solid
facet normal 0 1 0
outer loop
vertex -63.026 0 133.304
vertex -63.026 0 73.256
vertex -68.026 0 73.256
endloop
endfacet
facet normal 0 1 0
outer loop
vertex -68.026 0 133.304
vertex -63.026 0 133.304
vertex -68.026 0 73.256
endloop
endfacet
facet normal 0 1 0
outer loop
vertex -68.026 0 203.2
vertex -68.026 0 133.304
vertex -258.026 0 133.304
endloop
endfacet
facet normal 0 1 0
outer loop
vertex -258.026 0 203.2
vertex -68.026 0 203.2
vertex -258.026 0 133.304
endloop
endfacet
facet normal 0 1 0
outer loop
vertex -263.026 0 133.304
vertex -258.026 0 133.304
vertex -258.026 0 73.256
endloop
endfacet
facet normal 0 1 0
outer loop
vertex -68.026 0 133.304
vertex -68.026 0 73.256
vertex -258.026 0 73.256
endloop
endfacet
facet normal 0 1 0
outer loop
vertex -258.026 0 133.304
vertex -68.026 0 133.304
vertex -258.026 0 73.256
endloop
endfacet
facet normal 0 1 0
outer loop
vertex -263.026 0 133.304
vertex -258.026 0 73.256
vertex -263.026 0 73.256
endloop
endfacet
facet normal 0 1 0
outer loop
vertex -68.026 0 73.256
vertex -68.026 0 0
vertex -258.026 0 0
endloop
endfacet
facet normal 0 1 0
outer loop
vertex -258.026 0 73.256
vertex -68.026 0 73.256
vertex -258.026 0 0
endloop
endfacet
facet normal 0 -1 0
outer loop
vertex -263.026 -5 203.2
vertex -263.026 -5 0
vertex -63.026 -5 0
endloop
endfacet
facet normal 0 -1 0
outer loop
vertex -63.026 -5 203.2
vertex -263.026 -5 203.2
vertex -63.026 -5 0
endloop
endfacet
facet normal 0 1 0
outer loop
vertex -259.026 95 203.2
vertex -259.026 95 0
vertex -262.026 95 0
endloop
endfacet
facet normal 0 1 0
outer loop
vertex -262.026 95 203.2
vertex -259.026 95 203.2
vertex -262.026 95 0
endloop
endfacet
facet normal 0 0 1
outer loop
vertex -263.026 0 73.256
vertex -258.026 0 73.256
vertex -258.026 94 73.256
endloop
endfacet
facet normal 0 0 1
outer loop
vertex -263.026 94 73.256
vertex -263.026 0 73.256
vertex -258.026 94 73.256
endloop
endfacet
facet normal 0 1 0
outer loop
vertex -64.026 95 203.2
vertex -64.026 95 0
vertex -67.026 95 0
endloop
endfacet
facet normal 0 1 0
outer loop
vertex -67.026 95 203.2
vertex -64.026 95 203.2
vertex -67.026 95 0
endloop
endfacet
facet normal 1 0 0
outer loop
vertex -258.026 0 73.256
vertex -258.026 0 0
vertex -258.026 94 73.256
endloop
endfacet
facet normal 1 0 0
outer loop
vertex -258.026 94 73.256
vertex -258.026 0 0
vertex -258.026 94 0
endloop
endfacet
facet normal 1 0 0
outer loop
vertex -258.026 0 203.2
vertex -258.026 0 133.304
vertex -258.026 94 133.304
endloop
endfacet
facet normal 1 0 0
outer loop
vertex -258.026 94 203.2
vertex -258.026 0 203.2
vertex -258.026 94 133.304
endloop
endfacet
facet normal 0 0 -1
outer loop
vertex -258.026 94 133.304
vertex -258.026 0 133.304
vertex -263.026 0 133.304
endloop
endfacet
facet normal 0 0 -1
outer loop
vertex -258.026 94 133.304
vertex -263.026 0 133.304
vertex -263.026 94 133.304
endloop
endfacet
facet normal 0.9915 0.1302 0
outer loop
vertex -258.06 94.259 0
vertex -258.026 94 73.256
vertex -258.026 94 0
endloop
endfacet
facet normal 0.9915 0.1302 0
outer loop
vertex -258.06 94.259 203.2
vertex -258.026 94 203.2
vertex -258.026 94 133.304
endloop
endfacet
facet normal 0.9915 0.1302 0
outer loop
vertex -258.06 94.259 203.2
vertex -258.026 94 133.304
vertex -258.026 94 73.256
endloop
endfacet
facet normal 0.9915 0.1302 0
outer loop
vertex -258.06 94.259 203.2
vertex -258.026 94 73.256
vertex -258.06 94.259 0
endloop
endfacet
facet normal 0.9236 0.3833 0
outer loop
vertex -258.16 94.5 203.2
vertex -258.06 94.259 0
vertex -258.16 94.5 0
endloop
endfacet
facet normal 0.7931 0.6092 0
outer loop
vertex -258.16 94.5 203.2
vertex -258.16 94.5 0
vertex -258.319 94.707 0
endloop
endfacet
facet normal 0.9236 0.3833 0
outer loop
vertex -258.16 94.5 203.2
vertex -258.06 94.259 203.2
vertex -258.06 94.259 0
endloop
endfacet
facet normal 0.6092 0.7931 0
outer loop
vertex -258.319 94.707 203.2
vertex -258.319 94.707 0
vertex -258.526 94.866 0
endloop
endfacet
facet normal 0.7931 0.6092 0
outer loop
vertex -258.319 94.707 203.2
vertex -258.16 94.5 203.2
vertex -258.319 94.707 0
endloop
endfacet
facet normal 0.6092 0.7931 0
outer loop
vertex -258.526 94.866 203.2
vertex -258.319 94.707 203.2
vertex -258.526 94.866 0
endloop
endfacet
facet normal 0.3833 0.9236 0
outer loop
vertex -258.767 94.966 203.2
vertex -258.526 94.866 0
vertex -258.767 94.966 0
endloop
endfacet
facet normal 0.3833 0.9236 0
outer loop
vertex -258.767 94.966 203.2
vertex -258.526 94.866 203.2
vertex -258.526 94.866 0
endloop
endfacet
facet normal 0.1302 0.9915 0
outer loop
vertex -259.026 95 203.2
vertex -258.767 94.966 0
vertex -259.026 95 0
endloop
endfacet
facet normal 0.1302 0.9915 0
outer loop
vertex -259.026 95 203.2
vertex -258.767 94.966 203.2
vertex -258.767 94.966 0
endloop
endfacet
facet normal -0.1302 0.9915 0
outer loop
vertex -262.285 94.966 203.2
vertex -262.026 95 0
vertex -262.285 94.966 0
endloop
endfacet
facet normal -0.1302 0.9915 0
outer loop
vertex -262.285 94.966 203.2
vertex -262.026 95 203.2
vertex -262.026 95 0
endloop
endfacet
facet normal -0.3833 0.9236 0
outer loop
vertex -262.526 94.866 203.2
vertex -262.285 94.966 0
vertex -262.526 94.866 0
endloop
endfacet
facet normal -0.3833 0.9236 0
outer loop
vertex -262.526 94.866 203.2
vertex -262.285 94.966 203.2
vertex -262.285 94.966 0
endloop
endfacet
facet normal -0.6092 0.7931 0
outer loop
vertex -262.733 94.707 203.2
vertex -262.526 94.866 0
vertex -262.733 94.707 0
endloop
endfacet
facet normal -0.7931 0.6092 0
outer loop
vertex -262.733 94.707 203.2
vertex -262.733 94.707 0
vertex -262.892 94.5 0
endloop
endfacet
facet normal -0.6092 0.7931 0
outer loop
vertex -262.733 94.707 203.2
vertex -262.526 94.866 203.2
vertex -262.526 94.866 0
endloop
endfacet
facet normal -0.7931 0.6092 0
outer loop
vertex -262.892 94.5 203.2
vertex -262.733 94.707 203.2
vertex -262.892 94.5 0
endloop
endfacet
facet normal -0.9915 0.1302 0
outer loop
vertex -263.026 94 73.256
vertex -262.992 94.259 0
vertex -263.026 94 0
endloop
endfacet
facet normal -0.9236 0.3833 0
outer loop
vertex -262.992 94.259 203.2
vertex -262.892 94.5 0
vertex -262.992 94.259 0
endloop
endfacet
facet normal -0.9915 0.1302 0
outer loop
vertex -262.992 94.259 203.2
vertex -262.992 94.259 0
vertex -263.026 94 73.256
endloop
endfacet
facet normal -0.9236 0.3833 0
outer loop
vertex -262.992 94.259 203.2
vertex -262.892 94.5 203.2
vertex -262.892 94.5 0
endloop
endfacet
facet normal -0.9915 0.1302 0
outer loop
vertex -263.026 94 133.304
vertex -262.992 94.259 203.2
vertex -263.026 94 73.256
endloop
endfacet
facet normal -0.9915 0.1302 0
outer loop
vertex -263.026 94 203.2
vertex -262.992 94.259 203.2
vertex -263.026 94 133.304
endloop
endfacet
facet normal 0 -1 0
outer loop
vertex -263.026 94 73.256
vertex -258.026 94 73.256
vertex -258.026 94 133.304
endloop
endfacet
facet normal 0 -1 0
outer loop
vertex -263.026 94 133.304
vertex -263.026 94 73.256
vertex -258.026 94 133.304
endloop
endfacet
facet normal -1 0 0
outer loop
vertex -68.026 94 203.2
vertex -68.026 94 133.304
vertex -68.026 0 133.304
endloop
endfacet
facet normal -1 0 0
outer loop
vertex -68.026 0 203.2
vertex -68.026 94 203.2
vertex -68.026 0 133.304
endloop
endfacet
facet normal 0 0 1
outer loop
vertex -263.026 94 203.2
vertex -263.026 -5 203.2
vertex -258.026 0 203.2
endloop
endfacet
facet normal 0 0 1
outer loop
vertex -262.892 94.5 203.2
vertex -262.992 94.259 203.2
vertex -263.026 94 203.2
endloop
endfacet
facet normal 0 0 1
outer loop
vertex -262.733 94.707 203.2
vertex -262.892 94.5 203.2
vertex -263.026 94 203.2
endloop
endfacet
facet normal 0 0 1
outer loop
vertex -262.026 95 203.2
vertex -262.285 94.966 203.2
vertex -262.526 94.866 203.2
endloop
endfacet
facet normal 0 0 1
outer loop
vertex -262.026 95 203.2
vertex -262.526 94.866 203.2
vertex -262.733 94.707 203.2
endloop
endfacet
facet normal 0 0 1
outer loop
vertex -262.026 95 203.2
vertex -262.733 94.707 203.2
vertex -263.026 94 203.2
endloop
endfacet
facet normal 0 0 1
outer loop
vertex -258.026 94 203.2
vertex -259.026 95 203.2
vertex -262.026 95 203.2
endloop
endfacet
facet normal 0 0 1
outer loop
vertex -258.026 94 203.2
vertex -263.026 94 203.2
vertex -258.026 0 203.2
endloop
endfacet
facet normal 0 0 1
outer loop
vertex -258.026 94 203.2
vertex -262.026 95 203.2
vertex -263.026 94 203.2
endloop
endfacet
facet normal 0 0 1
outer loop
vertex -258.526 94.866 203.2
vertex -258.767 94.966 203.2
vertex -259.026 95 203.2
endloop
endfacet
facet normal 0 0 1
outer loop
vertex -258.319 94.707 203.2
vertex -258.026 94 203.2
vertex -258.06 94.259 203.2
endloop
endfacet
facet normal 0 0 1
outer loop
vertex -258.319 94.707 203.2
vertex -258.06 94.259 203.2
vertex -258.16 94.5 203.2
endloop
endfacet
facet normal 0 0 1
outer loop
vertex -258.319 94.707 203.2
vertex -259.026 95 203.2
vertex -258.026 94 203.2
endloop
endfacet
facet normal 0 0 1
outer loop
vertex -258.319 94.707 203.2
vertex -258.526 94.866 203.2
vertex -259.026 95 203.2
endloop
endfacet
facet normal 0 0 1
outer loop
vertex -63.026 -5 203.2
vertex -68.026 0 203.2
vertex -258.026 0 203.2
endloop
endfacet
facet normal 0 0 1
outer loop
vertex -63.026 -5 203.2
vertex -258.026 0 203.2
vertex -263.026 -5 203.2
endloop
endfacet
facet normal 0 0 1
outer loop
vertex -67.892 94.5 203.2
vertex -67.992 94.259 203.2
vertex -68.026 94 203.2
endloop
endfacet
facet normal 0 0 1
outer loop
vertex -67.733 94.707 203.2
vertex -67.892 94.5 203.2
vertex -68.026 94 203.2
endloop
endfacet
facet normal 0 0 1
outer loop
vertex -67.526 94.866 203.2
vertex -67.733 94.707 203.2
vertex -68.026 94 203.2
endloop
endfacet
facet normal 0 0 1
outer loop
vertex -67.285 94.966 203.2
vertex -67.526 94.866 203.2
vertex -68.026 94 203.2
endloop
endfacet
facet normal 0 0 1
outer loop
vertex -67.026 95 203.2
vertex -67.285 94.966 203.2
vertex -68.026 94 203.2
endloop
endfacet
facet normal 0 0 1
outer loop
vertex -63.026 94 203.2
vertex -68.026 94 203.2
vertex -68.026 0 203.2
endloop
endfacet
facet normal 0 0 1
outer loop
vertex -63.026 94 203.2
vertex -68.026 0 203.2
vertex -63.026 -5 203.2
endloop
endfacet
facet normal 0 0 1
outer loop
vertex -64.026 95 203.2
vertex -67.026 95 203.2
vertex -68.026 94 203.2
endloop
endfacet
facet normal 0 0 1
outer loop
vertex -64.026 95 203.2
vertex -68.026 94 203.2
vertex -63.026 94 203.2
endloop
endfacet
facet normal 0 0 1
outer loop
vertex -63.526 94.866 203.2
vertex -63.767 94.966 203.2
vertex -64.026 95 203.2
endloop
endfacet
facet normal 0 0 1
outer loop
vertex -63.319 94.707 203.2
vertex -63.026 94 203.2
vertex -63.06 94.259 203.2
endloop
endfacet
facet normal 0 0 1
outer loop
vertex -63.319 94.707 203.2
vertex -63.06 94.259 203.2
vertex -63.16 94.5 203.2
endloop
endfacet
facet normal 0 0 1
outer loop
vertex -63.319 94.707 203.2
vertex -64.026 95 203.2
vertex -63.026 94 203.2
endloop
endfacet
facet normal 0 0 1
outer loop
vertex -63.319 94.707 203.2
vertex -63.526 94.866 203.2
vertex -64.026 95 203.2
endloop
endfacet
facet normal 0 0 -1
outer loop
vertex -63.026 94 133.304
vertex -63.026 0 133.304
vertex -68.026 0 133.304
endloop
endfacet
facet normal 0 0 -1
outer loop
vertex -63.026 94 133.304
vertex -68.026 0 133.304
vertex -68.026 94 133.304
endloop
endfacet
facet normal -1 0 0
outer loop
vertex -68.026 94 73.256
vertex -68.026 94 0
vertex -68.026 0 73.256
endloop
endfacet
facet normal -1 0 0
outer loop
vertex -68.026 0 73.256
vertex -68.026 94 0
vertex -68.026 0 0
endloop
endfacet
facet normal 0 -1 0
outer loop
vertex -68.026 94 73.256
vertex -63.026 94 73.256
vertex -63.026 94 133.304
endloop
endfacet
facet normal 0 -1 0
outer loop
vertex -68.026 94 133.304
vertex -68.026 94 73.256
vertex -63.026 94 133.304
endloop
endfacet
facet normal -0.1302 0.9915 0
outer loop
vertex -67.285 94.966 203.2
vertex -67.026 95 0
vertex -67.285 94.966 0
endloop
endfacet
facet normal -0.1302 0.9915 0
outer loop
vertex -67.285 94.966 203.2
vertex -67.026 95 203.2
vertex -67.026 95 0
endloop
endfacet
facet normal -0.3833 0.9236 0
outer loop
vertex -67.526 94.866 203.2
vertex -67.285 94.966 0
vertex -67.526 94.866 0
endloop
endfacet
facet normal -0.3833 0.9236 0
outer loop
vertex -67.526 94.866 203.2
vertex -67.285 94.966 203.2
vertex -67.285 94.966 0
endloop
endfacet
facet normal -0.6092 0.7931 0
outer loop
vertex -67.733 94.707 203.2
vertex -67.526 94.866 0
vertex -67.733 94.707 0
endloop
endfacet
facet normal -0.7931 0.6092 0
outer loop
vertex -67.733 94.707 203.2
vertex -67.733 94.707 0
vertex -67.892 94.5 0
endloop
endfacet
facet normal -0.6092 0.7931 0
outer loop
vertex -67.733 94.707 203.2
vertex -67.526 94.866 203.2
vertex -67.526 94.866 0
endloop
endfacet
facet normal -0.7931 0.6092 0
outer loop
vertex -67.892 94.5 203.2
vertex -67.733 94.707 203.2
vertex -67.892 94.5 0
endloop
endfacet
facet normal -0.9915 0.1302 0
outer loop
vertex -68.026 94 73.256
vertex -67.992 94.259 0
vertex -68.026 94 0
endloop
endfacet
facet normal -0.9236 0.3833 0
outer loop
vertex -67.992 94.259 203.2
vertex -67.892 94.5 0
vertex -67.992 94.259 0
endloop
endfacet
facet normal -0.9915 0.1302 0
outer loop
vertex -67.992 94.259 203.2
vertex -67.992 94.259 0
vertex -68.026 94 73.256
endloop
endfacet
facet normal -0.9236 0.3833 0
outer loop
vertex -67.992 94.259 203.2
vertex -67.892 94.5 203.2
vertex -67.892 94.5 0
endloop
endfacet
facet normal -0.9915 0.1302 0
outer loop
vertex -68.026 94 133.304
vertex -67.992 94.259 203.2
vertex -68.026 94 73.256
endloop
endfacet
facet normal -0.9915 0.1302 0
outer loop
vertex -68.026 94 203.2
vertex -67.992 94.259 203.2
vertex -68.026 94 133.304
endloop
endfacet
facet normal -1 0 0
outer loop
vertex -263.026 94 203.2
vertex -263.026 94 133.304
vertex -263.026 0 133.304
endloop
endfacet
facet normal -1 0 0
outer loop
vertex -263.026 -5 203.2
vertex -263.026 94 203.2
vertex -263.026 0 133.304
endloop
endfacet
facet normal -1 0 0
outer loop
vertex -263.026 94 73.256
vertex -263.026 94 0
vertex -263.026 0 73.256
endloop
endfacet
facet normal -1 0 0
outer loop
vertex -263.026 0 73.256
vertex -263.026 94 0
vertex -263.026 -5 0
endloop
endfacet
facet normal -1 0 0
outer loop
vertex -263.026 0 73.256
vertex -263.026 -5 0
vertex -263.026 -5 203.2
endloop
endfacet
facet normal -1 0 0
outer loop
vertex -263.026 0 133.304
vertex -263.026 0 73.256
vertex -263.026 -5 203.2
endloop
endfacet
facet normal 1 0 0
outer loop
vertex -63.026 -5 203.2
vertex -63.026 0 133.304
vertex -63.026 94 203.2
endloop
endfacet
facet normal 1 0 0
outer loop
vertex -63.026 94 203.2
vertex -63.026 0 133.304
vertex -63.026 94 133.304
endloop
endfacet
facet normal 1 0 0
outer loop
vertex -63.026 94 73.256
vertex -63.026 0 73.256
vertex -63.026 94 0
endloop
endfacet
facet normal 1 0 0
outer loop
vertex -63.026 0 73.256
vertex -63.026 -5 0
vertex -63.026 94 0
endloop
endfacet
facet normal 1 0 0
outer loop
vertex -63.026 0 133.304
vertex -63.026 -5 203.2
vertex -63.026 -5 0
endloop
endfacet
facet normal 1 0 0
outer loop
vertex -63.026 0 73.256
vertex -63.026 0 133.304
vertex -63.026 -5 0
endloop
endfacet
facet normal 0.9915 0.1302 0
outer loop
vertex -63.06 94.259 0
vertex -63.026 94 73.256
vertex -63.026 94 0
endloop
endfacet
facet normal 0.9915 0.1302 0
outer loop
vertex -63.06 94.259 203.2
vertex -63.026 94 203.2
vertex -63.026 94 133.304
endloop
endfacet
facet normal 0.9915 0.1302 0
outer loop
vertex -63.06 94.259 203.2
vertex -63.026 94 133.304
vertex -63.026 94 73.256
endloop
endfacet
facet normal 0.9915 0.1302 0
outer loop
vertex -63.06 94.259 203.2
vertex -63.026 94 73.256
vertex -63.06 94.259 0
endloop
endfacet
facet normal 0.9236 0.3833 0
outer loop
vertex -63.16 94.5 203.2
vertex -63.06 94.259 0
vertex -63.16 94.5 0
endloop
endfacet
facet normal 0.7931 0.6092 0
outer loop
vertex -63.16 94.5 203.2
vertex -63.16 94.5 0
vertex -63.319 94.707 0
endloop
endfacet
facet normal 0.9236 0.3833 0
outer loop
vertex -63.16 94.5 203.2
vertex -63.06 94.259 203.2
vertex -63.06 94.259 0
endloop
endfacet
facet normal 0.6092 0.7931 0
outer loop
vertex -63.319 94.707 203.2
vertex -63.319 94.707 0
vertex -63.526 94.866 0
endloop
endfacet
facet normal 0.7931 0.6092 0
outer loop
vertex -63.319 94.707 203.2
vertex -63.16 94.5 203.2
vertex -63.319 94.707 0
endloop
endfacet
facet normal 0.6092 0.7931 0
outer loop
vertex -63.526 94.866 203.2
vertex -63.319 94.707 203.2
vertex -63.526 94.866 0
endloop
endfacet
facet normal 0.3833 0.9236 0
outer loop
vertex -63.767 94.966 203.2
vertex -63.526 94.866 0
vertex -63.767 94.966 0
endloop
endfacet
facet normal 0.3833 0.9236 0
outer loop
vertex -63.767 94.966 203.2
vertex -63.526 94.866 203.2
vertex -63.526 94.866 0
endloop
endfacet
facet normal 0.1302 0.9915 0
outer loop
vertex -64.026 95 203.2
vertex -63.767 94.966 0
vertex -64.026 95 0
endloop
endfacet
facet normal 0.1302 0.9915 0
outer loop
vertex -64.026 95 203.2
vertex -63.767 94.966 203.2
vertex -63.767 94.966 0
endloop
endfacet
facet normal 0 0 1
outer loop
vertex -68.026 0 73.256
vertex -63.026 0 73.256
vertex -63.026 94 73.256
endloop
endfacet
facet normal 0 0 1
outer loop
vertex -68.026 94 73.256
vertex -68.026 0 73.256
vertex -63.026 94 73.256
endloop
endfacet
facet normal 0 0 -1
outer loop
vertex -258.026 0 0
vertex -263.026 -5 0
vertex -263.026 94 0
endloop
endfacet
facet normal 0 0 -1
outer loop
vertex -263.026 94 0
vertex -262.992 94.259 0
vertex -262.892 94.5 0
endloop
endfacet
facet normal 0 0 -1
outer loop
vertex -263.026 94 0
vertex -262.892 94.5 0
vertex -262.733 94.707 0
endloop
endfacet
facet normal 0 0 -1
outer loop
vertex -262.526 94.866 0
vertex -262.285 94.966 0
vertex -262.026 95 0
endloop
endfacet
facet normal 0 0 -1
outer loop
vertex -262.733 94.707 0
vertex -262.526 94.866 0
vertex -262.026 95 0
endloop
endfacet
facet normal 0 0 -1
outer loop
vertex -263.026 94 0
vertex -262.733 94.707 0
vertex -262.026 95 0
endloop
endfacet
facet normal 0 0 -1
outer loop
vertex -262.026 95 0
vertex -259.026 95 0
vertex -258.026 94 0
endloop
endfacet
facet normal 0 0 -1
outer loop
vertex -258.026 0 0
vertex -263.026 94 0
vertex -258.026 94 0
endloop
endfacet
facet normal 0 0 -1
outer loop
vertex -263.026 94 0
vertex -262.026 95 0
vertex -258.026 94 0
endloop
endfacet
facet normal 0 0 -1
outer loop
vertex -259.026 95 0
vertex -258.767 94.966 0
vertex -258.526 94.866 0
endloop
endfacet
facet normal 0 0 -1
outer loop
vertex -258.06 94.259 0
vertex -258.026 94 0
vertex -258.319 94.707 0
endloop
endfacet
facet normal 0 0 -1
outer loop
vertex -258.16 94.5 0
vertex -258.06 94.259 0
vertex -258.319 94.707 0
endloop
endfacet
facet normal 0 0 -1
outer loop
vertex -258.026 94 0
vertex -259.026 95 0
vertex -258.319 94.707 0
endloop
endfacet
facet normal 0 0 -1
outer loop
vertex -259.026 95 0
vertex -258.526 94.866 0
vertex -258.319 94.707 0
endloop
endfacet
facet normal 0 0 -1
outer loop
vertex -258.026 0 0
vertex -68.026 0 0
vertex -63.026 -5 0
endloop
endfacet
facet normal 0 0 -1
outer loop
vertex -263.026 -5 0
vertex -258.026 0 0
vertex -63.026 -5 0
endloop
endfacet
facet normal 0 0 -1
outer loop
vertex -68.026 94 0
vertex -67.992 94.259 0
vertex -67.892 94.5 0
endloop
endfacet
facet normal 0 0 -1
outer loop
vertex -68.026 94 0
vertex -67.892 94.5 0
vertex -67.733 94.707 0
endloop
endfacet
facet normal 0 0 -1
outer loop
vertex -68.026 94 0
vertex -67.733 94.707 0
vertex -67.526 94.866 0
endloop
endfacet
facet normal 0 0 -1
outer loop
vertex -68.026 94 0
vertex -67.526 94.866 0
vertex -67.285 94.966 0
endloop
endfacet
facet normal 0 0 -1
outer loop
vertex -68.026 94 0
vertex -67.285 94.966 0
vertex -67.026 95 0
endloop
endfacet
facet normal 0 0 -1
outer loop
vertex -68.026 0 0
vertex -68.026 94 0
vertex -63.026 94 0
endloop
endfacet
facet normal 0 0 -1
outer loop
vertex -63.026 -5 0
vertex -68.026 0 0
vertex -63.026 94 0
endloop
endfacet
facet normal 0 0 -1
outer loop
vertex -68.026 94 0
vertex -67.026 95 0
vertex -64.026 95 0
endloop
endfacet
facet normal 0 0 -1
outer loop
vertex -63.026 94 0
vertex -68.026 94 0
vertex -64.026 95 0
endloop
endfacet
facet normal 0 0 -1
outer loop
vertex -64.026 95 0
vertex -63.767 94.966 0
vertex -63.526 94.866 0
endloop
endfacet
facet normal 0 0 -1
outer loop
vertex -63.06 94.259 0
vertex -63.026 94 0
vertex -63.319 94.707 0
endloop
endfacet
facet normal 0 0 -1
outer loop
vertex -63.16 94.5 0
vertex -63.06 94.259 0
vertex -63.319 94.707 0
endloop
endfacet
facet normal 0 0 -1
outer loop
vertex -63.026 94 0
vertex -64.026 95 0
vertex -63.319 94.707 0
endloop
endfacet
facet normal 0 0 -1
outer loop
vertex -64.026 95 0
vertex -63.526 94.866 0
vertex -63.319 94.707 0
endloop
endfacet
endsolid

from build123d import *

# Parameters (mm, degrees)
F1_DEPTH = 203.2
F2_R     = 1
F3_W     = 94
F3_H     = 60.048782
F4_DEPTH = 300


with BuildPart() as f1:
    # F0 (on Top) → F1 (new body)
    with BuildSketch(Plane.XY):
        Polygon((-68.026056, 0), (-258.026056, 0), (-258.026056, 95), (-263.026056, 95), (-263.026056, -5), (-63.026056, -5), (-63.026056, 95), (-68.026056, 95), align=None)
    extrude(amount=F1_DEPTH)

    # F2
    f2_edges = [f1.edges().sort_by_distance(p)[0] for p in [
        (-63.026056, 95, 101.6),
        (-68.026056, 95, 101.6),
        (-258.026056, 95, 101.6),
        (-263.026056, 95, 101.6),
    ]]
    fillet(f2_edges, radius=F2_R)

    # F3 (on face) → F4 (cut)
    with BuildSketch(Plane.YZ.offset(-63.026056)):
        with Locations((47, 103.279952)):
            Rectangle(F3_W, F3_H)
    extrude(amount=-F4_DEPTH, mode=Mode.SUBTRACT)


solid = f1.part
